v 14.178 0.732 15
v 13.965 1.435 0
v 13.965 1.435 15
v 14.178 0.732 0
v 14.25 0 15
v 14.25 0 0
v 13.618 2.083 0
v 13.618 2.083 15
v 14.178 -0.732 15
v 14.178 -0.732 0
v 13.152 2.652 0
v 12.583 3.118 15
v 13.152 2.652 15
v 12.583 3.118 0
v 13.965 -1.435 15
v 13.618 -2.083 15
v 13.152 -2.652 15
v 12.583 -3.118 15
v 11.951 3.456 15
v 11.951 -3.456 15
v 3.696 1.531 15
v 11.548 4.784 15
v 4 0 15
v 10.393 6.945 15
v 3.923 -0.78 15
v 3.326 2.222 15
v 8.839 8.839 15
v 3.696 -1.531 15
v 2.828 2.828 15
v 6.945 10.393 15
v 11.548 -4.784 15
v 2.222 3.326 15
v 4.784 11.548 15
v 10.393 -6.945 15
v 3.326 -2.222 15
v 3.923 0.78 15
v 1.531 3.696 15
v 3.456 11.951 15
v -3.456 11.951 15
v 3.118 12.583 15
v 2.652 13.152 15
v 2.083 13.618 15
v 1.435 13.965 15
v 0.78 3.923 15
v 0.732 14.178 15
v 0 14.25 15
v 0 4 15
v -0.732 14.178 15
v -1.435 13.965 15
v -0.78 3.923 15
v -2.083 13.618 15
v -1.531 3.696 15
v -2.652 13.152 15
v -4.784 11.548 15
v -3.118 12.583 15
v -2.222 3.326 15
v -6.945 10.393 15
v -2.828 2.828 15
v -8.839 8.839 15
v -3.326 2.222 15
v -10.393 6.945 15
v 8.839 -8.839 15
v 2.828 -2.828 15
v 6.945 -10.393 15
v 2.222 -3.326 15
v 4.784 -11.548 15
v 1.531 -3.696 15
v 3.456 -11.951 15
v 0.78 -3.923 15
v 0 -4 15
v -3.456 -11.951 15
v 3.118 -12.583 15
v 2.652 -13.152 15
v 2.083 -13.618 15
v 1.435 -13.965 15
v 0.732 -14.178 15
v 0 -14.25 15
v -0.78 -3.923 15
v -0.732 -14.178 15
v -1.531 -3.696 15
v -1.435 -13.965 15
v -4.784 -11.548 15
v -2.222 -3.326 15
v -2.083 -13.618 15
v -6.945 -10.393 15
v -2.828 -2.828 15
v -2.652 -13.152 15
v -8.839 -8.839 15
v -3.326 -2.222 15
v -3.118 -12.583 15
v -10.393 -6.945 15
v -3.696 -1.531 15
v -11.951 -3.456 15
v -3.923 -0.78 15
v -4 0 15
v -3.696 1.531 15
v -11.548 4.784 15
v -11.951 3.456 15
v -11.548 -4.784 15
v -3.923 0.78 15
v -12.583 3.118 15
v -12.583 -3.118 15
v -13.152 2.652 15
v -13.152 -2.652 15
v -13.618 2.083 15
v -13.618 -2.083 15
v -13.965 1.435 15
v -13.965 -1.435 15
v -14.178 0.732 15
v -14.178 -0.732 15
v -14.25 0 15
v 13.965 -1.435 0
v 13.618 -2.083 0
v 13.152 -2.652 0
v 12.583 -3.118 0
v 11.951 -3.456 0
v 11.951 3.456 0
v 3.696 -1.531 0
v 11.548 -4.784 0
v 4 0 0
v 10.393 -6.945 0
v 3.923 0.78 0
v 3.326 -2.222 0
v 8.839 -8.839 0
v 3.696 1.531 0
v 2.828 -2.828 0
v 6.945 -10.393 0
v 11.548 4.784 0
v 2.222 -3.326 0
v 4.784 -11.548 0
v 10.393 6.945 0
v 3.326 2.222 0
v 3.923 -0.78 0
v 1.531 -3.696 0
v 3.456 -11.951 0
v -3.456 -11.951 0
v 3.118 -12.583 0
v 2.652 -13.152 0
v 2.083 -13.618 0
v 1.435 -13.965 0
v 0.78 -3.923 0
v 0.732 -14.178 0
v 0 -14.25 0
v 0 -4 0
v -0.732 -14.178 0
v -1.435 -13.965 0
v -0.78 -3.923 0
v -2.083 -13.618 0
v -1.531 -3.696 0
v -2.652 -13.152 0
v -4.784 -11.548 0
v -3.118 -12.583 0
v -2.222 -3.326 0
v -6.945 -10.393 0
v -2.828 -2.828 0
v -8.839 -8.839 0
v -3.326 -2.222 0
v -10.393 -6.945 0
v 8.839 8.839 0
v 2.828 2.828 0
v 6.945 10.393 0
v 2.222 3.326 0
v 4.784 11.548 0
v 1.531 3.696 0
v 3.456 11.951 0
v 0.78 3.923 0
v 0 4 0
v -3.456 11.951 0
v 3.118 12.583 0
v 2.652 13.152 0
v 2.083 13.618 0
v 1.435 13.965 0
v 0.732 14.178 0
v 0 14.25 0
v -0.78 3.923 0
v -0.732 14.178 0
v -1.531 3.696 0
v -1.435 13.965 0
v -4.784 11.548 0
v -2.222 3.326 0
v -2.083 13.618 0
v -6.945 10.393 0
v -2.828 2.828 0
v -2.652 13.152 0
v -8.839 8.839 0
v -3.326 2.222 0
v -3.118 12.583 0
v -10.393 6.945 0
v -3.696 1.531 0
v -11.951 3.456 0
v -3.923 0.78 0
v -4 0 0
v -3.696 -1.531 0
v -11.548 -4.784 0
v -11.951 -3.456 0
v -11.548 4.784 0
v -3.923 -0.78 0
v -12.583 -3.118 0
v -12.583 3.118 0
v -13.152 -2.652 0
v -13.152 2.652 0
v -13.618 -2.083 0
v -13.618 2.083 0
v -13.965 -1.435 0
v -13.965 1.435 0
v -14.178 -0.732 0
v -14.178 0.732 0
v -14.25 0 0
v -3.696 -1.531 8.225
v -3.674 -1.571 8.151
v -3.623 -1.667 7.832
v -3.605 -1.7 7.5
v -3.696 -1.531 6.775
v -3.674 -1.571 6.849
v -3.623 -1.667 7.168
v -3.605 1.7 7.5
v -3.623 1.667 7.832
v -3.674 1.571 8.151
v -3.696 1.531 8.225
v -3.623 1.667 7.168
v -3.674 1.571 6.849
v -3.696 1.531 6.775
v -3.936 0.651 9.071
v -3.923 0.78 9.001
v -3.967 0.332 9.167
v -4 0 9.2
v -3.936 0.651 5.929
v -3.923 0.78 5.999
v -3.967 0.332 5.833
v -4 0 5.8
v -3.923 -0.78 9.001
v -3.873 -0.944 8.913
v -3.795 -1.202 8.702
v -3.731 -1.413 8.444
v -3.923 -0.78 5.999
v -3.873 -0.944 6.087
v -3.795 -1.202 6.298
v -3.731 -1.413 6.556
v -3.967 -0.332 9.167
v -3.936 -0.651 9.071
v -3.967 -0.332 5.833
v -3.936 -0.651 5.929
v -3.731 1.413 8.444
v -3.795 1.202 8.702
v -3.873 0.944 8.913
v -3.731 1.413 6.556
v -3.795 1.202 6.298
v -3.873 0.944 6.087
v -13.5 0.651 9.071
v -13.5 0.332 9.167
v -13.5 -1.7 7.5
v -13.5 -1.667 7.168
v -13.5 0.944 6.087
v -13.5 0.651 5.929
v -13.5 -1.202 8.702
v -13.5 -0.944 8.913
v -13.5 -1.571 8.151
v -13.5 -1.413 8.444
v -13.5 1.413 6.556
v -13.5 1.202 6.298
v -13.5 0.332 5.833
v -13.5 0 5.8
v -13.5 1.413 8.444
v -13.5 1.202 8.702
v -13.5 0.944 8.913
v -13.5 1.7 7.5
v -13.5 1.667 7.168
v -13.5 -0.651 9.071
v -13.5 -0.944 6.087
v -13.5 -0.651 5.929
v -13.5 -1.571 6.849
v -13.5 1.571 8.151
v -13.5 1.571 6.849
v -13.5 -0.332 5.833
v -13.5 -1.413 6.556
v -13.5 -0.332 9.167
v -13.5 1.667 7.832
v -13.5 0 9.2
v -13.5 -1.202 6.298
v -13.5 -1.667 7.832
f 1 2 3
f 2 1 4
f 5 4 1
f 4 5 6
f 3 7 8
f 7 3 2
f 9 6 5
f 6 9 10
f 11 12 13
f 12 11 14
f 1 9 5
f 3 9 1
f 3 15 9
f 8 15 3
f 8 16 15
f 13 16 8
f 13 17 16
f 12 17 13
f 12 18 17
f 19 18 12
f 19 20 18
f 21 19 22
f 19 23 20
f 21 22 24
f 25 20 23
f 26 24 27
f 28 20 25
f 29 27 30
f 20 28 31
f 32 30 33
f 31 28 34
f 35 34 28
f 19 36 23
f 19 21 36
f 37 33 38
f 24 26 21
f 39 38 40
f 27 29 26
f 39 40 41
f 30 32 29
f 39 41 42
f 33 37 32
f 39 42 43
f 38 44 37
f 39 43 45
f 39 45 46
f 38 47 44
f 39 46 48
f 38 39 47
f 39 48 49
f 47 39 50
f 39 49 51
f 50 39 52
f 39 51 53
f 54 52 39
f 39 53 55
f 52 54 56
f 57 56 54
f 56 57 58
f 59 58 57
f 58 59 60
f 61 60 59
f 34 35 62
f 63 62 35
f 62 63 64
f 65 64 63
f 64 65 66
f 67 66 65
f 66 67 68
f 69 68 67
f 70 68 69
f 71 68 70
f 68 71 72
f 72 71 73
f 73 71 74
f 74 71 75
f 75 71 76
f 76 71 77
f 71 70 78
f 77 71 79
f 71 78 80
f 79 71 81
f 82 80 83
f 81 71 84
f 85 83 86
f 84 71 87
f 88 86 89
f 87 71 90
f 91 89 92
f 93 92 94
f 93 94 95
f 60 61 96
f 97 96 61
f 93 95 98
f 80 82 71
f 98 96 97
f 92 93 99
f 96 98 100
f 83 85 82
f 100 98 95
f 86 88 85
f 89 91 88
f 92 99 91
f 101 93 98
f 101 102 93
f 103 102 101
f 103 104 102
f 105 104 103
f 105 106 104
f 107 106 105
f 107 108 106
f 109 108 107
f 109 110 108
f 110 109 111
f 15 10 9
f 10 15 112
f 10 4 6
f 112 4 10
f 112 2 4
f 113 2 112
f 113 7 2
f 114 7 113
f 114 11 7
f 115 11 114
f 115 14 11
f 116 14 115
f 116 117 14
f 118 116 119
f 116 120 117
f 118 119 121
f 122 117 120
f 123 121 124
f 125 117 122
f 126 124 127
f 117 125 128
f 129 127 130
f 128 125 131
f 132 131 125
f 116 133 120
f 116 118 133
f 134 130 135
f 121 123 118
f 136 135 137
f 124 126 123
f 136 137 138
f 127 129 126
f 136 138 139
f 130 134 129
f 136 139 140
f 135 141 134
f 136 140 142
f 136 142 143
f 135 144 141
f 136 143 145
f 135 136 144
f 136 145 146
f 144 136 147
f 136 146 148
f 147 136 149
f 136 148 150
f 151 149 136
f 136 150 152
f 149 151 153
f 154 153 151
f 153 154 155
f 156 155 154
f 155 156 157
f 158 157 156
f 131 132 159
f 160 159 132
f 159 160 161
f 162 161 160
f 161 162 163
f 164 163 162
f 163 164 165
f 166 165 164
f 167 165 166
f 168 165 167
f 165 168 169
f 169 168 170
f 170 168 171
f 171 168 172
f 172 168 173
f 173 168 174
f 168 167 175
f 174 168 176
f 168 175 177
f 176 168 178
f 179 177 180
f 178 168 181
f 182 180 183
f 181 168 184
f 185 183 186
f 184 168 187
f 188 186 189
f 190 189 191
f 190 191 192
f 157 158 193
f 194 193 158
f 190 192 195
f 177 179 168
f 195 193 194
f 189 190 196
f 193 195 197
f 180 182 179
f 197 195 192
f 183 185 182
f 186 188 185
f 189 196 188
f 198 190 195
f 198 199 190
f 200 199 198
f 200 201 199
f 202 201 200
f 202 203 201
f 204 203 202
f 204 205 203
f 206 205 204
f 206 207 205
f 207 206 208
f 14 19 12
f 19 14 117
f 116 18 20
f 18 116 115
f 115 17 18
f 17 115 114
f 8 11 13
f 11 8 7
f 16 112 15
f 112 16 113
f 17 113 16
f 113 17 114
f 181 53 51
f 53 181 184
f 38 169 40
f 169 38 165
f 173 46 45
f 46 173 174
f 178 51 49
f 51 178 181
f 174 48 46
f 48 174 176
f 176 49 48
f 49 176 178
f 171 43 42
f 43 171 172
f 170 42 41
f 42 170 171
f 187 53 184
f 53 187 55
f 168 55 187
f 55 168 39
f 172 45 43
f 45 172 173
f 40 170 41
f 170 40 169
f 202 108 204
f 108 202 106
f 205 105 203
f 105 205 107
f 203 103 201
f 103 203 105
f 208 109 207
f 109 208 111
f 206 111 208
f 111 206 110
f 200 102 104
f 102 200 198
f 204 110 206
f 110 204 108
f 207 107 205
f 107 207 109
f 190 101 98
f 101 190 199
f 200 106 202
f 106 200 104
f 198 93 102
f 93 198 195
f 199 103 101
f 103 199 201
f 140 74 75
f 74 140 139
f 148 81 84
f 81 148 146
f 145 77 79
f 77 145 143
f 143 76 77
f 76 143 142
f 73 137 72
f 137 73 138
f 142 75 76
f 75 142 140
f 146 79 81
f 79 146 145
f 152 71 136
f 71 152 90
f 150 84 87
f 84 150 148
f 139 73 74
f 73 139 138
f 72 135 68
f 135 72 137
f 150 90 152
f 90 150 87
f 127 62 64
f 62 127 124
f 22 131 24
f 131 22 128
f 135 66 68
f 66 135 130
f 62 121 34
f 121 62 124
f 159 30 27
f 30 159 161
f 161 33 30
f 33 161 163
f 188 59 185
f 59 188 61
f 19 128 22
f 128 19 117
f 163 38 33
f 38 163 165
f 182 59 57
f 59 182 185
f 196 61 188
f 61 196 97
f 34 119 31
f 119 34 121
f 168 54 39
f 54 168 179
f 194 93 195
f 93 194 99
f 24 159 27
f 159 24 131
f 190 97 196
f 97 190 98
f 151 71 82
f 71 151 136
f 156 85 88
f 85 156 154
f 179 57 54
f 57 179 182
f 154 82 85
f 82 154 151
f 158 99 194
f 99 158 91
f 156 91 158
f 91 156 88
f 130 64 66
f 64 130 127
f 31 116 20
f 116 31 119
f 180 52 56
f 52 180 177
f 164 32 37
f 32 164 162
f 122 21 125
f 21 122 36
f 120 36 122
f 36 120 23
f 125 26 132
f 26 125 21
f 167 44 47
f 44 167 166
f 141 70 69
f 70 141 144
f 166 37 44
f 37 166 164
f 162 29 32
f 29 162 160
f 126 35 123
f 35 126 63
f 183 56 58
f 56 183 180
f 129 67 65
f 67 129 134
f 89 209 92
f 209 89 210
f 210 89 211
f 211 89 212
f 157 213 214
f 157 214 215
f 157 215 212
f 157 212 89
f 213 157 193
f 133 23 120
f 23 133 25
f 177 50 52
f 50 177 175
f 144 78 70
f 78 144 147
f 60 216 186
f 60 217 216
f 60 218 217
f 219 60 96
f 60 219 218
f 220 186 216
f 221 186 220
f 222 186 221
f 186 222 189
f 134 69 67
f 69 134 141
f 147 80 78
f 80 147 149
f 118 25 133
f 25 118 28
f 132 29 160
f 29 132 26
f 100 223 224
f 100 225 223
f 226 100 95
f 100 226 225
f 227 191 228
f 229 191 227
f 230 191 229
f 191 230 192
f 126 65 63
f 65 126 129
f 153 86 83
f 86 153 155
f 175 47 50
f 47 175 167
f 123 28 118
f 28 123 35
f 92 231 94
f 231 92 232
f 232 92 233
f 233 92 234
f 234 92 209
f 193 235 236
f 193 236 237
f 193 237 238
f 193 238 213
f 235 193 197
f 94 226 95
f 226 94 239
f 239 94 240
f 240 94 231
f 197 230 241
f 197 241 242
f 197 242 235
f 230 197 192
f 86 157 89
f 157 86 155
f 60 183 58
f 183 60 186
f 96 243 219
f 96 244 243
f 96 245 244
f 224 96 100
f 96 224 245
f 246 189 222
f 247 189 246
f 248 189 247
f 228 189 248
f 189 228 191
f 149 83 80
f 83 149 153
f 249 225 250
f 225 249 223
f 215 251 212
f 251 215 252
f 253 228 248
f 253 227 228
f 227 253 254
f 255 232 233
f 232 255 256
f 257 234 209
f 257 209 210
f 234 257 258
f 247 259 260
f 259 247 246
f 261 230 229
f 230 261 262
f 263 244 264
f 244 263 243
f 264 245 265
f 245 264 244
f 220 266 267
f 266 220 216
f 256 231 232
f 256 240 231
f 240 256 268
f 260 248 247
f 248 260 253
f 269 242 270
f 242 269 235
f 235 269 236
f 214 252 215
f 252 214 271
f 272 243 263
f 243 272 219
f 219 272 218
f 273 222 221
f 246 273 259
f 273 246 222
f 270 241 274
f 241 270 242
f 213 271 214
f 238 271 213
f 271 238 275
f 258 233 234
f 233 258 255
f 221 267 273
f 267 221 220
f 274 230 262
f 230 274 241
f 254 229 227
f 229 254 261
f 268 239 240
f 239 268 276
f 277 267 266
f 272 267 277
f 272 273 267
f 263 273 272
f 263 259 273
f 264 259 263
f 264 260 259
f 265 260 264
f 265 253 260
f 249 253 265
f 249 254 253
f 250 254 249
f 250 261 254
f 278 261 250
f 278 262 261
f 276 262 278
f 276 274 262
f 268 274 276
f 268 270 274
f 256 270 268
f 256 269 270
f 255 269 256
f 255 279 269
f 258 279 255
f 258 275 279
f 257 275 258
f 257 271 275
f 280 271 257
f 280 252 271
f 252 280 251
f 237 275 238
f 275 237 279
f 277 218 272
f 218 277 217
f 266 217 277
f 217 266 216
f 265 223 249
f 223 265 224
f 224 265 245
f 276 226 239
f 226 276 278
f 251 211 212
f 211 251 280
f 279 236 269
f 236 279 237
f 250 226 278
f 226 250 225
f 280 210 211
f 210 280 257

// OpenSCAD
$fn = 32;

// ----------------------------------------------------------------------
// Hand knob: 25 x 25 x 15 mm
// ----------------------------------------------------------------------

// --- parameters (mm) ---
knob_d = 25;              // knob diameter
knob_h = 15;              // knob height
bore_d = 8;               // shaft bore
set_d = 3.4;              // set screw tap hole
knurl_d = 0.71;           // knurl groove diameter
lobes = 4;                // grip lobes

module body() {
  cylinder(h = knob_h, d = knob_d);
  for (i = [0 : lobes - 1])
    rotate([0, 0, i * 360 / lobes])
      translate([knob_d * 0.42, 0, 0])
        cylinder(h = knob_h, d = knob_d * 0.3);
}

difference() {
  union() {
    body();
  }
  translate([0, 0, -1]) cylinder(h = knob_h + 0 + 2, d = bore_d);
  translate([-knob_d / 2 - 1, 0, knob_h * 0.5]) rotate([0, 90, 0]) cylinder(h = knob_d / 2 + 2, d = set_d);
}
